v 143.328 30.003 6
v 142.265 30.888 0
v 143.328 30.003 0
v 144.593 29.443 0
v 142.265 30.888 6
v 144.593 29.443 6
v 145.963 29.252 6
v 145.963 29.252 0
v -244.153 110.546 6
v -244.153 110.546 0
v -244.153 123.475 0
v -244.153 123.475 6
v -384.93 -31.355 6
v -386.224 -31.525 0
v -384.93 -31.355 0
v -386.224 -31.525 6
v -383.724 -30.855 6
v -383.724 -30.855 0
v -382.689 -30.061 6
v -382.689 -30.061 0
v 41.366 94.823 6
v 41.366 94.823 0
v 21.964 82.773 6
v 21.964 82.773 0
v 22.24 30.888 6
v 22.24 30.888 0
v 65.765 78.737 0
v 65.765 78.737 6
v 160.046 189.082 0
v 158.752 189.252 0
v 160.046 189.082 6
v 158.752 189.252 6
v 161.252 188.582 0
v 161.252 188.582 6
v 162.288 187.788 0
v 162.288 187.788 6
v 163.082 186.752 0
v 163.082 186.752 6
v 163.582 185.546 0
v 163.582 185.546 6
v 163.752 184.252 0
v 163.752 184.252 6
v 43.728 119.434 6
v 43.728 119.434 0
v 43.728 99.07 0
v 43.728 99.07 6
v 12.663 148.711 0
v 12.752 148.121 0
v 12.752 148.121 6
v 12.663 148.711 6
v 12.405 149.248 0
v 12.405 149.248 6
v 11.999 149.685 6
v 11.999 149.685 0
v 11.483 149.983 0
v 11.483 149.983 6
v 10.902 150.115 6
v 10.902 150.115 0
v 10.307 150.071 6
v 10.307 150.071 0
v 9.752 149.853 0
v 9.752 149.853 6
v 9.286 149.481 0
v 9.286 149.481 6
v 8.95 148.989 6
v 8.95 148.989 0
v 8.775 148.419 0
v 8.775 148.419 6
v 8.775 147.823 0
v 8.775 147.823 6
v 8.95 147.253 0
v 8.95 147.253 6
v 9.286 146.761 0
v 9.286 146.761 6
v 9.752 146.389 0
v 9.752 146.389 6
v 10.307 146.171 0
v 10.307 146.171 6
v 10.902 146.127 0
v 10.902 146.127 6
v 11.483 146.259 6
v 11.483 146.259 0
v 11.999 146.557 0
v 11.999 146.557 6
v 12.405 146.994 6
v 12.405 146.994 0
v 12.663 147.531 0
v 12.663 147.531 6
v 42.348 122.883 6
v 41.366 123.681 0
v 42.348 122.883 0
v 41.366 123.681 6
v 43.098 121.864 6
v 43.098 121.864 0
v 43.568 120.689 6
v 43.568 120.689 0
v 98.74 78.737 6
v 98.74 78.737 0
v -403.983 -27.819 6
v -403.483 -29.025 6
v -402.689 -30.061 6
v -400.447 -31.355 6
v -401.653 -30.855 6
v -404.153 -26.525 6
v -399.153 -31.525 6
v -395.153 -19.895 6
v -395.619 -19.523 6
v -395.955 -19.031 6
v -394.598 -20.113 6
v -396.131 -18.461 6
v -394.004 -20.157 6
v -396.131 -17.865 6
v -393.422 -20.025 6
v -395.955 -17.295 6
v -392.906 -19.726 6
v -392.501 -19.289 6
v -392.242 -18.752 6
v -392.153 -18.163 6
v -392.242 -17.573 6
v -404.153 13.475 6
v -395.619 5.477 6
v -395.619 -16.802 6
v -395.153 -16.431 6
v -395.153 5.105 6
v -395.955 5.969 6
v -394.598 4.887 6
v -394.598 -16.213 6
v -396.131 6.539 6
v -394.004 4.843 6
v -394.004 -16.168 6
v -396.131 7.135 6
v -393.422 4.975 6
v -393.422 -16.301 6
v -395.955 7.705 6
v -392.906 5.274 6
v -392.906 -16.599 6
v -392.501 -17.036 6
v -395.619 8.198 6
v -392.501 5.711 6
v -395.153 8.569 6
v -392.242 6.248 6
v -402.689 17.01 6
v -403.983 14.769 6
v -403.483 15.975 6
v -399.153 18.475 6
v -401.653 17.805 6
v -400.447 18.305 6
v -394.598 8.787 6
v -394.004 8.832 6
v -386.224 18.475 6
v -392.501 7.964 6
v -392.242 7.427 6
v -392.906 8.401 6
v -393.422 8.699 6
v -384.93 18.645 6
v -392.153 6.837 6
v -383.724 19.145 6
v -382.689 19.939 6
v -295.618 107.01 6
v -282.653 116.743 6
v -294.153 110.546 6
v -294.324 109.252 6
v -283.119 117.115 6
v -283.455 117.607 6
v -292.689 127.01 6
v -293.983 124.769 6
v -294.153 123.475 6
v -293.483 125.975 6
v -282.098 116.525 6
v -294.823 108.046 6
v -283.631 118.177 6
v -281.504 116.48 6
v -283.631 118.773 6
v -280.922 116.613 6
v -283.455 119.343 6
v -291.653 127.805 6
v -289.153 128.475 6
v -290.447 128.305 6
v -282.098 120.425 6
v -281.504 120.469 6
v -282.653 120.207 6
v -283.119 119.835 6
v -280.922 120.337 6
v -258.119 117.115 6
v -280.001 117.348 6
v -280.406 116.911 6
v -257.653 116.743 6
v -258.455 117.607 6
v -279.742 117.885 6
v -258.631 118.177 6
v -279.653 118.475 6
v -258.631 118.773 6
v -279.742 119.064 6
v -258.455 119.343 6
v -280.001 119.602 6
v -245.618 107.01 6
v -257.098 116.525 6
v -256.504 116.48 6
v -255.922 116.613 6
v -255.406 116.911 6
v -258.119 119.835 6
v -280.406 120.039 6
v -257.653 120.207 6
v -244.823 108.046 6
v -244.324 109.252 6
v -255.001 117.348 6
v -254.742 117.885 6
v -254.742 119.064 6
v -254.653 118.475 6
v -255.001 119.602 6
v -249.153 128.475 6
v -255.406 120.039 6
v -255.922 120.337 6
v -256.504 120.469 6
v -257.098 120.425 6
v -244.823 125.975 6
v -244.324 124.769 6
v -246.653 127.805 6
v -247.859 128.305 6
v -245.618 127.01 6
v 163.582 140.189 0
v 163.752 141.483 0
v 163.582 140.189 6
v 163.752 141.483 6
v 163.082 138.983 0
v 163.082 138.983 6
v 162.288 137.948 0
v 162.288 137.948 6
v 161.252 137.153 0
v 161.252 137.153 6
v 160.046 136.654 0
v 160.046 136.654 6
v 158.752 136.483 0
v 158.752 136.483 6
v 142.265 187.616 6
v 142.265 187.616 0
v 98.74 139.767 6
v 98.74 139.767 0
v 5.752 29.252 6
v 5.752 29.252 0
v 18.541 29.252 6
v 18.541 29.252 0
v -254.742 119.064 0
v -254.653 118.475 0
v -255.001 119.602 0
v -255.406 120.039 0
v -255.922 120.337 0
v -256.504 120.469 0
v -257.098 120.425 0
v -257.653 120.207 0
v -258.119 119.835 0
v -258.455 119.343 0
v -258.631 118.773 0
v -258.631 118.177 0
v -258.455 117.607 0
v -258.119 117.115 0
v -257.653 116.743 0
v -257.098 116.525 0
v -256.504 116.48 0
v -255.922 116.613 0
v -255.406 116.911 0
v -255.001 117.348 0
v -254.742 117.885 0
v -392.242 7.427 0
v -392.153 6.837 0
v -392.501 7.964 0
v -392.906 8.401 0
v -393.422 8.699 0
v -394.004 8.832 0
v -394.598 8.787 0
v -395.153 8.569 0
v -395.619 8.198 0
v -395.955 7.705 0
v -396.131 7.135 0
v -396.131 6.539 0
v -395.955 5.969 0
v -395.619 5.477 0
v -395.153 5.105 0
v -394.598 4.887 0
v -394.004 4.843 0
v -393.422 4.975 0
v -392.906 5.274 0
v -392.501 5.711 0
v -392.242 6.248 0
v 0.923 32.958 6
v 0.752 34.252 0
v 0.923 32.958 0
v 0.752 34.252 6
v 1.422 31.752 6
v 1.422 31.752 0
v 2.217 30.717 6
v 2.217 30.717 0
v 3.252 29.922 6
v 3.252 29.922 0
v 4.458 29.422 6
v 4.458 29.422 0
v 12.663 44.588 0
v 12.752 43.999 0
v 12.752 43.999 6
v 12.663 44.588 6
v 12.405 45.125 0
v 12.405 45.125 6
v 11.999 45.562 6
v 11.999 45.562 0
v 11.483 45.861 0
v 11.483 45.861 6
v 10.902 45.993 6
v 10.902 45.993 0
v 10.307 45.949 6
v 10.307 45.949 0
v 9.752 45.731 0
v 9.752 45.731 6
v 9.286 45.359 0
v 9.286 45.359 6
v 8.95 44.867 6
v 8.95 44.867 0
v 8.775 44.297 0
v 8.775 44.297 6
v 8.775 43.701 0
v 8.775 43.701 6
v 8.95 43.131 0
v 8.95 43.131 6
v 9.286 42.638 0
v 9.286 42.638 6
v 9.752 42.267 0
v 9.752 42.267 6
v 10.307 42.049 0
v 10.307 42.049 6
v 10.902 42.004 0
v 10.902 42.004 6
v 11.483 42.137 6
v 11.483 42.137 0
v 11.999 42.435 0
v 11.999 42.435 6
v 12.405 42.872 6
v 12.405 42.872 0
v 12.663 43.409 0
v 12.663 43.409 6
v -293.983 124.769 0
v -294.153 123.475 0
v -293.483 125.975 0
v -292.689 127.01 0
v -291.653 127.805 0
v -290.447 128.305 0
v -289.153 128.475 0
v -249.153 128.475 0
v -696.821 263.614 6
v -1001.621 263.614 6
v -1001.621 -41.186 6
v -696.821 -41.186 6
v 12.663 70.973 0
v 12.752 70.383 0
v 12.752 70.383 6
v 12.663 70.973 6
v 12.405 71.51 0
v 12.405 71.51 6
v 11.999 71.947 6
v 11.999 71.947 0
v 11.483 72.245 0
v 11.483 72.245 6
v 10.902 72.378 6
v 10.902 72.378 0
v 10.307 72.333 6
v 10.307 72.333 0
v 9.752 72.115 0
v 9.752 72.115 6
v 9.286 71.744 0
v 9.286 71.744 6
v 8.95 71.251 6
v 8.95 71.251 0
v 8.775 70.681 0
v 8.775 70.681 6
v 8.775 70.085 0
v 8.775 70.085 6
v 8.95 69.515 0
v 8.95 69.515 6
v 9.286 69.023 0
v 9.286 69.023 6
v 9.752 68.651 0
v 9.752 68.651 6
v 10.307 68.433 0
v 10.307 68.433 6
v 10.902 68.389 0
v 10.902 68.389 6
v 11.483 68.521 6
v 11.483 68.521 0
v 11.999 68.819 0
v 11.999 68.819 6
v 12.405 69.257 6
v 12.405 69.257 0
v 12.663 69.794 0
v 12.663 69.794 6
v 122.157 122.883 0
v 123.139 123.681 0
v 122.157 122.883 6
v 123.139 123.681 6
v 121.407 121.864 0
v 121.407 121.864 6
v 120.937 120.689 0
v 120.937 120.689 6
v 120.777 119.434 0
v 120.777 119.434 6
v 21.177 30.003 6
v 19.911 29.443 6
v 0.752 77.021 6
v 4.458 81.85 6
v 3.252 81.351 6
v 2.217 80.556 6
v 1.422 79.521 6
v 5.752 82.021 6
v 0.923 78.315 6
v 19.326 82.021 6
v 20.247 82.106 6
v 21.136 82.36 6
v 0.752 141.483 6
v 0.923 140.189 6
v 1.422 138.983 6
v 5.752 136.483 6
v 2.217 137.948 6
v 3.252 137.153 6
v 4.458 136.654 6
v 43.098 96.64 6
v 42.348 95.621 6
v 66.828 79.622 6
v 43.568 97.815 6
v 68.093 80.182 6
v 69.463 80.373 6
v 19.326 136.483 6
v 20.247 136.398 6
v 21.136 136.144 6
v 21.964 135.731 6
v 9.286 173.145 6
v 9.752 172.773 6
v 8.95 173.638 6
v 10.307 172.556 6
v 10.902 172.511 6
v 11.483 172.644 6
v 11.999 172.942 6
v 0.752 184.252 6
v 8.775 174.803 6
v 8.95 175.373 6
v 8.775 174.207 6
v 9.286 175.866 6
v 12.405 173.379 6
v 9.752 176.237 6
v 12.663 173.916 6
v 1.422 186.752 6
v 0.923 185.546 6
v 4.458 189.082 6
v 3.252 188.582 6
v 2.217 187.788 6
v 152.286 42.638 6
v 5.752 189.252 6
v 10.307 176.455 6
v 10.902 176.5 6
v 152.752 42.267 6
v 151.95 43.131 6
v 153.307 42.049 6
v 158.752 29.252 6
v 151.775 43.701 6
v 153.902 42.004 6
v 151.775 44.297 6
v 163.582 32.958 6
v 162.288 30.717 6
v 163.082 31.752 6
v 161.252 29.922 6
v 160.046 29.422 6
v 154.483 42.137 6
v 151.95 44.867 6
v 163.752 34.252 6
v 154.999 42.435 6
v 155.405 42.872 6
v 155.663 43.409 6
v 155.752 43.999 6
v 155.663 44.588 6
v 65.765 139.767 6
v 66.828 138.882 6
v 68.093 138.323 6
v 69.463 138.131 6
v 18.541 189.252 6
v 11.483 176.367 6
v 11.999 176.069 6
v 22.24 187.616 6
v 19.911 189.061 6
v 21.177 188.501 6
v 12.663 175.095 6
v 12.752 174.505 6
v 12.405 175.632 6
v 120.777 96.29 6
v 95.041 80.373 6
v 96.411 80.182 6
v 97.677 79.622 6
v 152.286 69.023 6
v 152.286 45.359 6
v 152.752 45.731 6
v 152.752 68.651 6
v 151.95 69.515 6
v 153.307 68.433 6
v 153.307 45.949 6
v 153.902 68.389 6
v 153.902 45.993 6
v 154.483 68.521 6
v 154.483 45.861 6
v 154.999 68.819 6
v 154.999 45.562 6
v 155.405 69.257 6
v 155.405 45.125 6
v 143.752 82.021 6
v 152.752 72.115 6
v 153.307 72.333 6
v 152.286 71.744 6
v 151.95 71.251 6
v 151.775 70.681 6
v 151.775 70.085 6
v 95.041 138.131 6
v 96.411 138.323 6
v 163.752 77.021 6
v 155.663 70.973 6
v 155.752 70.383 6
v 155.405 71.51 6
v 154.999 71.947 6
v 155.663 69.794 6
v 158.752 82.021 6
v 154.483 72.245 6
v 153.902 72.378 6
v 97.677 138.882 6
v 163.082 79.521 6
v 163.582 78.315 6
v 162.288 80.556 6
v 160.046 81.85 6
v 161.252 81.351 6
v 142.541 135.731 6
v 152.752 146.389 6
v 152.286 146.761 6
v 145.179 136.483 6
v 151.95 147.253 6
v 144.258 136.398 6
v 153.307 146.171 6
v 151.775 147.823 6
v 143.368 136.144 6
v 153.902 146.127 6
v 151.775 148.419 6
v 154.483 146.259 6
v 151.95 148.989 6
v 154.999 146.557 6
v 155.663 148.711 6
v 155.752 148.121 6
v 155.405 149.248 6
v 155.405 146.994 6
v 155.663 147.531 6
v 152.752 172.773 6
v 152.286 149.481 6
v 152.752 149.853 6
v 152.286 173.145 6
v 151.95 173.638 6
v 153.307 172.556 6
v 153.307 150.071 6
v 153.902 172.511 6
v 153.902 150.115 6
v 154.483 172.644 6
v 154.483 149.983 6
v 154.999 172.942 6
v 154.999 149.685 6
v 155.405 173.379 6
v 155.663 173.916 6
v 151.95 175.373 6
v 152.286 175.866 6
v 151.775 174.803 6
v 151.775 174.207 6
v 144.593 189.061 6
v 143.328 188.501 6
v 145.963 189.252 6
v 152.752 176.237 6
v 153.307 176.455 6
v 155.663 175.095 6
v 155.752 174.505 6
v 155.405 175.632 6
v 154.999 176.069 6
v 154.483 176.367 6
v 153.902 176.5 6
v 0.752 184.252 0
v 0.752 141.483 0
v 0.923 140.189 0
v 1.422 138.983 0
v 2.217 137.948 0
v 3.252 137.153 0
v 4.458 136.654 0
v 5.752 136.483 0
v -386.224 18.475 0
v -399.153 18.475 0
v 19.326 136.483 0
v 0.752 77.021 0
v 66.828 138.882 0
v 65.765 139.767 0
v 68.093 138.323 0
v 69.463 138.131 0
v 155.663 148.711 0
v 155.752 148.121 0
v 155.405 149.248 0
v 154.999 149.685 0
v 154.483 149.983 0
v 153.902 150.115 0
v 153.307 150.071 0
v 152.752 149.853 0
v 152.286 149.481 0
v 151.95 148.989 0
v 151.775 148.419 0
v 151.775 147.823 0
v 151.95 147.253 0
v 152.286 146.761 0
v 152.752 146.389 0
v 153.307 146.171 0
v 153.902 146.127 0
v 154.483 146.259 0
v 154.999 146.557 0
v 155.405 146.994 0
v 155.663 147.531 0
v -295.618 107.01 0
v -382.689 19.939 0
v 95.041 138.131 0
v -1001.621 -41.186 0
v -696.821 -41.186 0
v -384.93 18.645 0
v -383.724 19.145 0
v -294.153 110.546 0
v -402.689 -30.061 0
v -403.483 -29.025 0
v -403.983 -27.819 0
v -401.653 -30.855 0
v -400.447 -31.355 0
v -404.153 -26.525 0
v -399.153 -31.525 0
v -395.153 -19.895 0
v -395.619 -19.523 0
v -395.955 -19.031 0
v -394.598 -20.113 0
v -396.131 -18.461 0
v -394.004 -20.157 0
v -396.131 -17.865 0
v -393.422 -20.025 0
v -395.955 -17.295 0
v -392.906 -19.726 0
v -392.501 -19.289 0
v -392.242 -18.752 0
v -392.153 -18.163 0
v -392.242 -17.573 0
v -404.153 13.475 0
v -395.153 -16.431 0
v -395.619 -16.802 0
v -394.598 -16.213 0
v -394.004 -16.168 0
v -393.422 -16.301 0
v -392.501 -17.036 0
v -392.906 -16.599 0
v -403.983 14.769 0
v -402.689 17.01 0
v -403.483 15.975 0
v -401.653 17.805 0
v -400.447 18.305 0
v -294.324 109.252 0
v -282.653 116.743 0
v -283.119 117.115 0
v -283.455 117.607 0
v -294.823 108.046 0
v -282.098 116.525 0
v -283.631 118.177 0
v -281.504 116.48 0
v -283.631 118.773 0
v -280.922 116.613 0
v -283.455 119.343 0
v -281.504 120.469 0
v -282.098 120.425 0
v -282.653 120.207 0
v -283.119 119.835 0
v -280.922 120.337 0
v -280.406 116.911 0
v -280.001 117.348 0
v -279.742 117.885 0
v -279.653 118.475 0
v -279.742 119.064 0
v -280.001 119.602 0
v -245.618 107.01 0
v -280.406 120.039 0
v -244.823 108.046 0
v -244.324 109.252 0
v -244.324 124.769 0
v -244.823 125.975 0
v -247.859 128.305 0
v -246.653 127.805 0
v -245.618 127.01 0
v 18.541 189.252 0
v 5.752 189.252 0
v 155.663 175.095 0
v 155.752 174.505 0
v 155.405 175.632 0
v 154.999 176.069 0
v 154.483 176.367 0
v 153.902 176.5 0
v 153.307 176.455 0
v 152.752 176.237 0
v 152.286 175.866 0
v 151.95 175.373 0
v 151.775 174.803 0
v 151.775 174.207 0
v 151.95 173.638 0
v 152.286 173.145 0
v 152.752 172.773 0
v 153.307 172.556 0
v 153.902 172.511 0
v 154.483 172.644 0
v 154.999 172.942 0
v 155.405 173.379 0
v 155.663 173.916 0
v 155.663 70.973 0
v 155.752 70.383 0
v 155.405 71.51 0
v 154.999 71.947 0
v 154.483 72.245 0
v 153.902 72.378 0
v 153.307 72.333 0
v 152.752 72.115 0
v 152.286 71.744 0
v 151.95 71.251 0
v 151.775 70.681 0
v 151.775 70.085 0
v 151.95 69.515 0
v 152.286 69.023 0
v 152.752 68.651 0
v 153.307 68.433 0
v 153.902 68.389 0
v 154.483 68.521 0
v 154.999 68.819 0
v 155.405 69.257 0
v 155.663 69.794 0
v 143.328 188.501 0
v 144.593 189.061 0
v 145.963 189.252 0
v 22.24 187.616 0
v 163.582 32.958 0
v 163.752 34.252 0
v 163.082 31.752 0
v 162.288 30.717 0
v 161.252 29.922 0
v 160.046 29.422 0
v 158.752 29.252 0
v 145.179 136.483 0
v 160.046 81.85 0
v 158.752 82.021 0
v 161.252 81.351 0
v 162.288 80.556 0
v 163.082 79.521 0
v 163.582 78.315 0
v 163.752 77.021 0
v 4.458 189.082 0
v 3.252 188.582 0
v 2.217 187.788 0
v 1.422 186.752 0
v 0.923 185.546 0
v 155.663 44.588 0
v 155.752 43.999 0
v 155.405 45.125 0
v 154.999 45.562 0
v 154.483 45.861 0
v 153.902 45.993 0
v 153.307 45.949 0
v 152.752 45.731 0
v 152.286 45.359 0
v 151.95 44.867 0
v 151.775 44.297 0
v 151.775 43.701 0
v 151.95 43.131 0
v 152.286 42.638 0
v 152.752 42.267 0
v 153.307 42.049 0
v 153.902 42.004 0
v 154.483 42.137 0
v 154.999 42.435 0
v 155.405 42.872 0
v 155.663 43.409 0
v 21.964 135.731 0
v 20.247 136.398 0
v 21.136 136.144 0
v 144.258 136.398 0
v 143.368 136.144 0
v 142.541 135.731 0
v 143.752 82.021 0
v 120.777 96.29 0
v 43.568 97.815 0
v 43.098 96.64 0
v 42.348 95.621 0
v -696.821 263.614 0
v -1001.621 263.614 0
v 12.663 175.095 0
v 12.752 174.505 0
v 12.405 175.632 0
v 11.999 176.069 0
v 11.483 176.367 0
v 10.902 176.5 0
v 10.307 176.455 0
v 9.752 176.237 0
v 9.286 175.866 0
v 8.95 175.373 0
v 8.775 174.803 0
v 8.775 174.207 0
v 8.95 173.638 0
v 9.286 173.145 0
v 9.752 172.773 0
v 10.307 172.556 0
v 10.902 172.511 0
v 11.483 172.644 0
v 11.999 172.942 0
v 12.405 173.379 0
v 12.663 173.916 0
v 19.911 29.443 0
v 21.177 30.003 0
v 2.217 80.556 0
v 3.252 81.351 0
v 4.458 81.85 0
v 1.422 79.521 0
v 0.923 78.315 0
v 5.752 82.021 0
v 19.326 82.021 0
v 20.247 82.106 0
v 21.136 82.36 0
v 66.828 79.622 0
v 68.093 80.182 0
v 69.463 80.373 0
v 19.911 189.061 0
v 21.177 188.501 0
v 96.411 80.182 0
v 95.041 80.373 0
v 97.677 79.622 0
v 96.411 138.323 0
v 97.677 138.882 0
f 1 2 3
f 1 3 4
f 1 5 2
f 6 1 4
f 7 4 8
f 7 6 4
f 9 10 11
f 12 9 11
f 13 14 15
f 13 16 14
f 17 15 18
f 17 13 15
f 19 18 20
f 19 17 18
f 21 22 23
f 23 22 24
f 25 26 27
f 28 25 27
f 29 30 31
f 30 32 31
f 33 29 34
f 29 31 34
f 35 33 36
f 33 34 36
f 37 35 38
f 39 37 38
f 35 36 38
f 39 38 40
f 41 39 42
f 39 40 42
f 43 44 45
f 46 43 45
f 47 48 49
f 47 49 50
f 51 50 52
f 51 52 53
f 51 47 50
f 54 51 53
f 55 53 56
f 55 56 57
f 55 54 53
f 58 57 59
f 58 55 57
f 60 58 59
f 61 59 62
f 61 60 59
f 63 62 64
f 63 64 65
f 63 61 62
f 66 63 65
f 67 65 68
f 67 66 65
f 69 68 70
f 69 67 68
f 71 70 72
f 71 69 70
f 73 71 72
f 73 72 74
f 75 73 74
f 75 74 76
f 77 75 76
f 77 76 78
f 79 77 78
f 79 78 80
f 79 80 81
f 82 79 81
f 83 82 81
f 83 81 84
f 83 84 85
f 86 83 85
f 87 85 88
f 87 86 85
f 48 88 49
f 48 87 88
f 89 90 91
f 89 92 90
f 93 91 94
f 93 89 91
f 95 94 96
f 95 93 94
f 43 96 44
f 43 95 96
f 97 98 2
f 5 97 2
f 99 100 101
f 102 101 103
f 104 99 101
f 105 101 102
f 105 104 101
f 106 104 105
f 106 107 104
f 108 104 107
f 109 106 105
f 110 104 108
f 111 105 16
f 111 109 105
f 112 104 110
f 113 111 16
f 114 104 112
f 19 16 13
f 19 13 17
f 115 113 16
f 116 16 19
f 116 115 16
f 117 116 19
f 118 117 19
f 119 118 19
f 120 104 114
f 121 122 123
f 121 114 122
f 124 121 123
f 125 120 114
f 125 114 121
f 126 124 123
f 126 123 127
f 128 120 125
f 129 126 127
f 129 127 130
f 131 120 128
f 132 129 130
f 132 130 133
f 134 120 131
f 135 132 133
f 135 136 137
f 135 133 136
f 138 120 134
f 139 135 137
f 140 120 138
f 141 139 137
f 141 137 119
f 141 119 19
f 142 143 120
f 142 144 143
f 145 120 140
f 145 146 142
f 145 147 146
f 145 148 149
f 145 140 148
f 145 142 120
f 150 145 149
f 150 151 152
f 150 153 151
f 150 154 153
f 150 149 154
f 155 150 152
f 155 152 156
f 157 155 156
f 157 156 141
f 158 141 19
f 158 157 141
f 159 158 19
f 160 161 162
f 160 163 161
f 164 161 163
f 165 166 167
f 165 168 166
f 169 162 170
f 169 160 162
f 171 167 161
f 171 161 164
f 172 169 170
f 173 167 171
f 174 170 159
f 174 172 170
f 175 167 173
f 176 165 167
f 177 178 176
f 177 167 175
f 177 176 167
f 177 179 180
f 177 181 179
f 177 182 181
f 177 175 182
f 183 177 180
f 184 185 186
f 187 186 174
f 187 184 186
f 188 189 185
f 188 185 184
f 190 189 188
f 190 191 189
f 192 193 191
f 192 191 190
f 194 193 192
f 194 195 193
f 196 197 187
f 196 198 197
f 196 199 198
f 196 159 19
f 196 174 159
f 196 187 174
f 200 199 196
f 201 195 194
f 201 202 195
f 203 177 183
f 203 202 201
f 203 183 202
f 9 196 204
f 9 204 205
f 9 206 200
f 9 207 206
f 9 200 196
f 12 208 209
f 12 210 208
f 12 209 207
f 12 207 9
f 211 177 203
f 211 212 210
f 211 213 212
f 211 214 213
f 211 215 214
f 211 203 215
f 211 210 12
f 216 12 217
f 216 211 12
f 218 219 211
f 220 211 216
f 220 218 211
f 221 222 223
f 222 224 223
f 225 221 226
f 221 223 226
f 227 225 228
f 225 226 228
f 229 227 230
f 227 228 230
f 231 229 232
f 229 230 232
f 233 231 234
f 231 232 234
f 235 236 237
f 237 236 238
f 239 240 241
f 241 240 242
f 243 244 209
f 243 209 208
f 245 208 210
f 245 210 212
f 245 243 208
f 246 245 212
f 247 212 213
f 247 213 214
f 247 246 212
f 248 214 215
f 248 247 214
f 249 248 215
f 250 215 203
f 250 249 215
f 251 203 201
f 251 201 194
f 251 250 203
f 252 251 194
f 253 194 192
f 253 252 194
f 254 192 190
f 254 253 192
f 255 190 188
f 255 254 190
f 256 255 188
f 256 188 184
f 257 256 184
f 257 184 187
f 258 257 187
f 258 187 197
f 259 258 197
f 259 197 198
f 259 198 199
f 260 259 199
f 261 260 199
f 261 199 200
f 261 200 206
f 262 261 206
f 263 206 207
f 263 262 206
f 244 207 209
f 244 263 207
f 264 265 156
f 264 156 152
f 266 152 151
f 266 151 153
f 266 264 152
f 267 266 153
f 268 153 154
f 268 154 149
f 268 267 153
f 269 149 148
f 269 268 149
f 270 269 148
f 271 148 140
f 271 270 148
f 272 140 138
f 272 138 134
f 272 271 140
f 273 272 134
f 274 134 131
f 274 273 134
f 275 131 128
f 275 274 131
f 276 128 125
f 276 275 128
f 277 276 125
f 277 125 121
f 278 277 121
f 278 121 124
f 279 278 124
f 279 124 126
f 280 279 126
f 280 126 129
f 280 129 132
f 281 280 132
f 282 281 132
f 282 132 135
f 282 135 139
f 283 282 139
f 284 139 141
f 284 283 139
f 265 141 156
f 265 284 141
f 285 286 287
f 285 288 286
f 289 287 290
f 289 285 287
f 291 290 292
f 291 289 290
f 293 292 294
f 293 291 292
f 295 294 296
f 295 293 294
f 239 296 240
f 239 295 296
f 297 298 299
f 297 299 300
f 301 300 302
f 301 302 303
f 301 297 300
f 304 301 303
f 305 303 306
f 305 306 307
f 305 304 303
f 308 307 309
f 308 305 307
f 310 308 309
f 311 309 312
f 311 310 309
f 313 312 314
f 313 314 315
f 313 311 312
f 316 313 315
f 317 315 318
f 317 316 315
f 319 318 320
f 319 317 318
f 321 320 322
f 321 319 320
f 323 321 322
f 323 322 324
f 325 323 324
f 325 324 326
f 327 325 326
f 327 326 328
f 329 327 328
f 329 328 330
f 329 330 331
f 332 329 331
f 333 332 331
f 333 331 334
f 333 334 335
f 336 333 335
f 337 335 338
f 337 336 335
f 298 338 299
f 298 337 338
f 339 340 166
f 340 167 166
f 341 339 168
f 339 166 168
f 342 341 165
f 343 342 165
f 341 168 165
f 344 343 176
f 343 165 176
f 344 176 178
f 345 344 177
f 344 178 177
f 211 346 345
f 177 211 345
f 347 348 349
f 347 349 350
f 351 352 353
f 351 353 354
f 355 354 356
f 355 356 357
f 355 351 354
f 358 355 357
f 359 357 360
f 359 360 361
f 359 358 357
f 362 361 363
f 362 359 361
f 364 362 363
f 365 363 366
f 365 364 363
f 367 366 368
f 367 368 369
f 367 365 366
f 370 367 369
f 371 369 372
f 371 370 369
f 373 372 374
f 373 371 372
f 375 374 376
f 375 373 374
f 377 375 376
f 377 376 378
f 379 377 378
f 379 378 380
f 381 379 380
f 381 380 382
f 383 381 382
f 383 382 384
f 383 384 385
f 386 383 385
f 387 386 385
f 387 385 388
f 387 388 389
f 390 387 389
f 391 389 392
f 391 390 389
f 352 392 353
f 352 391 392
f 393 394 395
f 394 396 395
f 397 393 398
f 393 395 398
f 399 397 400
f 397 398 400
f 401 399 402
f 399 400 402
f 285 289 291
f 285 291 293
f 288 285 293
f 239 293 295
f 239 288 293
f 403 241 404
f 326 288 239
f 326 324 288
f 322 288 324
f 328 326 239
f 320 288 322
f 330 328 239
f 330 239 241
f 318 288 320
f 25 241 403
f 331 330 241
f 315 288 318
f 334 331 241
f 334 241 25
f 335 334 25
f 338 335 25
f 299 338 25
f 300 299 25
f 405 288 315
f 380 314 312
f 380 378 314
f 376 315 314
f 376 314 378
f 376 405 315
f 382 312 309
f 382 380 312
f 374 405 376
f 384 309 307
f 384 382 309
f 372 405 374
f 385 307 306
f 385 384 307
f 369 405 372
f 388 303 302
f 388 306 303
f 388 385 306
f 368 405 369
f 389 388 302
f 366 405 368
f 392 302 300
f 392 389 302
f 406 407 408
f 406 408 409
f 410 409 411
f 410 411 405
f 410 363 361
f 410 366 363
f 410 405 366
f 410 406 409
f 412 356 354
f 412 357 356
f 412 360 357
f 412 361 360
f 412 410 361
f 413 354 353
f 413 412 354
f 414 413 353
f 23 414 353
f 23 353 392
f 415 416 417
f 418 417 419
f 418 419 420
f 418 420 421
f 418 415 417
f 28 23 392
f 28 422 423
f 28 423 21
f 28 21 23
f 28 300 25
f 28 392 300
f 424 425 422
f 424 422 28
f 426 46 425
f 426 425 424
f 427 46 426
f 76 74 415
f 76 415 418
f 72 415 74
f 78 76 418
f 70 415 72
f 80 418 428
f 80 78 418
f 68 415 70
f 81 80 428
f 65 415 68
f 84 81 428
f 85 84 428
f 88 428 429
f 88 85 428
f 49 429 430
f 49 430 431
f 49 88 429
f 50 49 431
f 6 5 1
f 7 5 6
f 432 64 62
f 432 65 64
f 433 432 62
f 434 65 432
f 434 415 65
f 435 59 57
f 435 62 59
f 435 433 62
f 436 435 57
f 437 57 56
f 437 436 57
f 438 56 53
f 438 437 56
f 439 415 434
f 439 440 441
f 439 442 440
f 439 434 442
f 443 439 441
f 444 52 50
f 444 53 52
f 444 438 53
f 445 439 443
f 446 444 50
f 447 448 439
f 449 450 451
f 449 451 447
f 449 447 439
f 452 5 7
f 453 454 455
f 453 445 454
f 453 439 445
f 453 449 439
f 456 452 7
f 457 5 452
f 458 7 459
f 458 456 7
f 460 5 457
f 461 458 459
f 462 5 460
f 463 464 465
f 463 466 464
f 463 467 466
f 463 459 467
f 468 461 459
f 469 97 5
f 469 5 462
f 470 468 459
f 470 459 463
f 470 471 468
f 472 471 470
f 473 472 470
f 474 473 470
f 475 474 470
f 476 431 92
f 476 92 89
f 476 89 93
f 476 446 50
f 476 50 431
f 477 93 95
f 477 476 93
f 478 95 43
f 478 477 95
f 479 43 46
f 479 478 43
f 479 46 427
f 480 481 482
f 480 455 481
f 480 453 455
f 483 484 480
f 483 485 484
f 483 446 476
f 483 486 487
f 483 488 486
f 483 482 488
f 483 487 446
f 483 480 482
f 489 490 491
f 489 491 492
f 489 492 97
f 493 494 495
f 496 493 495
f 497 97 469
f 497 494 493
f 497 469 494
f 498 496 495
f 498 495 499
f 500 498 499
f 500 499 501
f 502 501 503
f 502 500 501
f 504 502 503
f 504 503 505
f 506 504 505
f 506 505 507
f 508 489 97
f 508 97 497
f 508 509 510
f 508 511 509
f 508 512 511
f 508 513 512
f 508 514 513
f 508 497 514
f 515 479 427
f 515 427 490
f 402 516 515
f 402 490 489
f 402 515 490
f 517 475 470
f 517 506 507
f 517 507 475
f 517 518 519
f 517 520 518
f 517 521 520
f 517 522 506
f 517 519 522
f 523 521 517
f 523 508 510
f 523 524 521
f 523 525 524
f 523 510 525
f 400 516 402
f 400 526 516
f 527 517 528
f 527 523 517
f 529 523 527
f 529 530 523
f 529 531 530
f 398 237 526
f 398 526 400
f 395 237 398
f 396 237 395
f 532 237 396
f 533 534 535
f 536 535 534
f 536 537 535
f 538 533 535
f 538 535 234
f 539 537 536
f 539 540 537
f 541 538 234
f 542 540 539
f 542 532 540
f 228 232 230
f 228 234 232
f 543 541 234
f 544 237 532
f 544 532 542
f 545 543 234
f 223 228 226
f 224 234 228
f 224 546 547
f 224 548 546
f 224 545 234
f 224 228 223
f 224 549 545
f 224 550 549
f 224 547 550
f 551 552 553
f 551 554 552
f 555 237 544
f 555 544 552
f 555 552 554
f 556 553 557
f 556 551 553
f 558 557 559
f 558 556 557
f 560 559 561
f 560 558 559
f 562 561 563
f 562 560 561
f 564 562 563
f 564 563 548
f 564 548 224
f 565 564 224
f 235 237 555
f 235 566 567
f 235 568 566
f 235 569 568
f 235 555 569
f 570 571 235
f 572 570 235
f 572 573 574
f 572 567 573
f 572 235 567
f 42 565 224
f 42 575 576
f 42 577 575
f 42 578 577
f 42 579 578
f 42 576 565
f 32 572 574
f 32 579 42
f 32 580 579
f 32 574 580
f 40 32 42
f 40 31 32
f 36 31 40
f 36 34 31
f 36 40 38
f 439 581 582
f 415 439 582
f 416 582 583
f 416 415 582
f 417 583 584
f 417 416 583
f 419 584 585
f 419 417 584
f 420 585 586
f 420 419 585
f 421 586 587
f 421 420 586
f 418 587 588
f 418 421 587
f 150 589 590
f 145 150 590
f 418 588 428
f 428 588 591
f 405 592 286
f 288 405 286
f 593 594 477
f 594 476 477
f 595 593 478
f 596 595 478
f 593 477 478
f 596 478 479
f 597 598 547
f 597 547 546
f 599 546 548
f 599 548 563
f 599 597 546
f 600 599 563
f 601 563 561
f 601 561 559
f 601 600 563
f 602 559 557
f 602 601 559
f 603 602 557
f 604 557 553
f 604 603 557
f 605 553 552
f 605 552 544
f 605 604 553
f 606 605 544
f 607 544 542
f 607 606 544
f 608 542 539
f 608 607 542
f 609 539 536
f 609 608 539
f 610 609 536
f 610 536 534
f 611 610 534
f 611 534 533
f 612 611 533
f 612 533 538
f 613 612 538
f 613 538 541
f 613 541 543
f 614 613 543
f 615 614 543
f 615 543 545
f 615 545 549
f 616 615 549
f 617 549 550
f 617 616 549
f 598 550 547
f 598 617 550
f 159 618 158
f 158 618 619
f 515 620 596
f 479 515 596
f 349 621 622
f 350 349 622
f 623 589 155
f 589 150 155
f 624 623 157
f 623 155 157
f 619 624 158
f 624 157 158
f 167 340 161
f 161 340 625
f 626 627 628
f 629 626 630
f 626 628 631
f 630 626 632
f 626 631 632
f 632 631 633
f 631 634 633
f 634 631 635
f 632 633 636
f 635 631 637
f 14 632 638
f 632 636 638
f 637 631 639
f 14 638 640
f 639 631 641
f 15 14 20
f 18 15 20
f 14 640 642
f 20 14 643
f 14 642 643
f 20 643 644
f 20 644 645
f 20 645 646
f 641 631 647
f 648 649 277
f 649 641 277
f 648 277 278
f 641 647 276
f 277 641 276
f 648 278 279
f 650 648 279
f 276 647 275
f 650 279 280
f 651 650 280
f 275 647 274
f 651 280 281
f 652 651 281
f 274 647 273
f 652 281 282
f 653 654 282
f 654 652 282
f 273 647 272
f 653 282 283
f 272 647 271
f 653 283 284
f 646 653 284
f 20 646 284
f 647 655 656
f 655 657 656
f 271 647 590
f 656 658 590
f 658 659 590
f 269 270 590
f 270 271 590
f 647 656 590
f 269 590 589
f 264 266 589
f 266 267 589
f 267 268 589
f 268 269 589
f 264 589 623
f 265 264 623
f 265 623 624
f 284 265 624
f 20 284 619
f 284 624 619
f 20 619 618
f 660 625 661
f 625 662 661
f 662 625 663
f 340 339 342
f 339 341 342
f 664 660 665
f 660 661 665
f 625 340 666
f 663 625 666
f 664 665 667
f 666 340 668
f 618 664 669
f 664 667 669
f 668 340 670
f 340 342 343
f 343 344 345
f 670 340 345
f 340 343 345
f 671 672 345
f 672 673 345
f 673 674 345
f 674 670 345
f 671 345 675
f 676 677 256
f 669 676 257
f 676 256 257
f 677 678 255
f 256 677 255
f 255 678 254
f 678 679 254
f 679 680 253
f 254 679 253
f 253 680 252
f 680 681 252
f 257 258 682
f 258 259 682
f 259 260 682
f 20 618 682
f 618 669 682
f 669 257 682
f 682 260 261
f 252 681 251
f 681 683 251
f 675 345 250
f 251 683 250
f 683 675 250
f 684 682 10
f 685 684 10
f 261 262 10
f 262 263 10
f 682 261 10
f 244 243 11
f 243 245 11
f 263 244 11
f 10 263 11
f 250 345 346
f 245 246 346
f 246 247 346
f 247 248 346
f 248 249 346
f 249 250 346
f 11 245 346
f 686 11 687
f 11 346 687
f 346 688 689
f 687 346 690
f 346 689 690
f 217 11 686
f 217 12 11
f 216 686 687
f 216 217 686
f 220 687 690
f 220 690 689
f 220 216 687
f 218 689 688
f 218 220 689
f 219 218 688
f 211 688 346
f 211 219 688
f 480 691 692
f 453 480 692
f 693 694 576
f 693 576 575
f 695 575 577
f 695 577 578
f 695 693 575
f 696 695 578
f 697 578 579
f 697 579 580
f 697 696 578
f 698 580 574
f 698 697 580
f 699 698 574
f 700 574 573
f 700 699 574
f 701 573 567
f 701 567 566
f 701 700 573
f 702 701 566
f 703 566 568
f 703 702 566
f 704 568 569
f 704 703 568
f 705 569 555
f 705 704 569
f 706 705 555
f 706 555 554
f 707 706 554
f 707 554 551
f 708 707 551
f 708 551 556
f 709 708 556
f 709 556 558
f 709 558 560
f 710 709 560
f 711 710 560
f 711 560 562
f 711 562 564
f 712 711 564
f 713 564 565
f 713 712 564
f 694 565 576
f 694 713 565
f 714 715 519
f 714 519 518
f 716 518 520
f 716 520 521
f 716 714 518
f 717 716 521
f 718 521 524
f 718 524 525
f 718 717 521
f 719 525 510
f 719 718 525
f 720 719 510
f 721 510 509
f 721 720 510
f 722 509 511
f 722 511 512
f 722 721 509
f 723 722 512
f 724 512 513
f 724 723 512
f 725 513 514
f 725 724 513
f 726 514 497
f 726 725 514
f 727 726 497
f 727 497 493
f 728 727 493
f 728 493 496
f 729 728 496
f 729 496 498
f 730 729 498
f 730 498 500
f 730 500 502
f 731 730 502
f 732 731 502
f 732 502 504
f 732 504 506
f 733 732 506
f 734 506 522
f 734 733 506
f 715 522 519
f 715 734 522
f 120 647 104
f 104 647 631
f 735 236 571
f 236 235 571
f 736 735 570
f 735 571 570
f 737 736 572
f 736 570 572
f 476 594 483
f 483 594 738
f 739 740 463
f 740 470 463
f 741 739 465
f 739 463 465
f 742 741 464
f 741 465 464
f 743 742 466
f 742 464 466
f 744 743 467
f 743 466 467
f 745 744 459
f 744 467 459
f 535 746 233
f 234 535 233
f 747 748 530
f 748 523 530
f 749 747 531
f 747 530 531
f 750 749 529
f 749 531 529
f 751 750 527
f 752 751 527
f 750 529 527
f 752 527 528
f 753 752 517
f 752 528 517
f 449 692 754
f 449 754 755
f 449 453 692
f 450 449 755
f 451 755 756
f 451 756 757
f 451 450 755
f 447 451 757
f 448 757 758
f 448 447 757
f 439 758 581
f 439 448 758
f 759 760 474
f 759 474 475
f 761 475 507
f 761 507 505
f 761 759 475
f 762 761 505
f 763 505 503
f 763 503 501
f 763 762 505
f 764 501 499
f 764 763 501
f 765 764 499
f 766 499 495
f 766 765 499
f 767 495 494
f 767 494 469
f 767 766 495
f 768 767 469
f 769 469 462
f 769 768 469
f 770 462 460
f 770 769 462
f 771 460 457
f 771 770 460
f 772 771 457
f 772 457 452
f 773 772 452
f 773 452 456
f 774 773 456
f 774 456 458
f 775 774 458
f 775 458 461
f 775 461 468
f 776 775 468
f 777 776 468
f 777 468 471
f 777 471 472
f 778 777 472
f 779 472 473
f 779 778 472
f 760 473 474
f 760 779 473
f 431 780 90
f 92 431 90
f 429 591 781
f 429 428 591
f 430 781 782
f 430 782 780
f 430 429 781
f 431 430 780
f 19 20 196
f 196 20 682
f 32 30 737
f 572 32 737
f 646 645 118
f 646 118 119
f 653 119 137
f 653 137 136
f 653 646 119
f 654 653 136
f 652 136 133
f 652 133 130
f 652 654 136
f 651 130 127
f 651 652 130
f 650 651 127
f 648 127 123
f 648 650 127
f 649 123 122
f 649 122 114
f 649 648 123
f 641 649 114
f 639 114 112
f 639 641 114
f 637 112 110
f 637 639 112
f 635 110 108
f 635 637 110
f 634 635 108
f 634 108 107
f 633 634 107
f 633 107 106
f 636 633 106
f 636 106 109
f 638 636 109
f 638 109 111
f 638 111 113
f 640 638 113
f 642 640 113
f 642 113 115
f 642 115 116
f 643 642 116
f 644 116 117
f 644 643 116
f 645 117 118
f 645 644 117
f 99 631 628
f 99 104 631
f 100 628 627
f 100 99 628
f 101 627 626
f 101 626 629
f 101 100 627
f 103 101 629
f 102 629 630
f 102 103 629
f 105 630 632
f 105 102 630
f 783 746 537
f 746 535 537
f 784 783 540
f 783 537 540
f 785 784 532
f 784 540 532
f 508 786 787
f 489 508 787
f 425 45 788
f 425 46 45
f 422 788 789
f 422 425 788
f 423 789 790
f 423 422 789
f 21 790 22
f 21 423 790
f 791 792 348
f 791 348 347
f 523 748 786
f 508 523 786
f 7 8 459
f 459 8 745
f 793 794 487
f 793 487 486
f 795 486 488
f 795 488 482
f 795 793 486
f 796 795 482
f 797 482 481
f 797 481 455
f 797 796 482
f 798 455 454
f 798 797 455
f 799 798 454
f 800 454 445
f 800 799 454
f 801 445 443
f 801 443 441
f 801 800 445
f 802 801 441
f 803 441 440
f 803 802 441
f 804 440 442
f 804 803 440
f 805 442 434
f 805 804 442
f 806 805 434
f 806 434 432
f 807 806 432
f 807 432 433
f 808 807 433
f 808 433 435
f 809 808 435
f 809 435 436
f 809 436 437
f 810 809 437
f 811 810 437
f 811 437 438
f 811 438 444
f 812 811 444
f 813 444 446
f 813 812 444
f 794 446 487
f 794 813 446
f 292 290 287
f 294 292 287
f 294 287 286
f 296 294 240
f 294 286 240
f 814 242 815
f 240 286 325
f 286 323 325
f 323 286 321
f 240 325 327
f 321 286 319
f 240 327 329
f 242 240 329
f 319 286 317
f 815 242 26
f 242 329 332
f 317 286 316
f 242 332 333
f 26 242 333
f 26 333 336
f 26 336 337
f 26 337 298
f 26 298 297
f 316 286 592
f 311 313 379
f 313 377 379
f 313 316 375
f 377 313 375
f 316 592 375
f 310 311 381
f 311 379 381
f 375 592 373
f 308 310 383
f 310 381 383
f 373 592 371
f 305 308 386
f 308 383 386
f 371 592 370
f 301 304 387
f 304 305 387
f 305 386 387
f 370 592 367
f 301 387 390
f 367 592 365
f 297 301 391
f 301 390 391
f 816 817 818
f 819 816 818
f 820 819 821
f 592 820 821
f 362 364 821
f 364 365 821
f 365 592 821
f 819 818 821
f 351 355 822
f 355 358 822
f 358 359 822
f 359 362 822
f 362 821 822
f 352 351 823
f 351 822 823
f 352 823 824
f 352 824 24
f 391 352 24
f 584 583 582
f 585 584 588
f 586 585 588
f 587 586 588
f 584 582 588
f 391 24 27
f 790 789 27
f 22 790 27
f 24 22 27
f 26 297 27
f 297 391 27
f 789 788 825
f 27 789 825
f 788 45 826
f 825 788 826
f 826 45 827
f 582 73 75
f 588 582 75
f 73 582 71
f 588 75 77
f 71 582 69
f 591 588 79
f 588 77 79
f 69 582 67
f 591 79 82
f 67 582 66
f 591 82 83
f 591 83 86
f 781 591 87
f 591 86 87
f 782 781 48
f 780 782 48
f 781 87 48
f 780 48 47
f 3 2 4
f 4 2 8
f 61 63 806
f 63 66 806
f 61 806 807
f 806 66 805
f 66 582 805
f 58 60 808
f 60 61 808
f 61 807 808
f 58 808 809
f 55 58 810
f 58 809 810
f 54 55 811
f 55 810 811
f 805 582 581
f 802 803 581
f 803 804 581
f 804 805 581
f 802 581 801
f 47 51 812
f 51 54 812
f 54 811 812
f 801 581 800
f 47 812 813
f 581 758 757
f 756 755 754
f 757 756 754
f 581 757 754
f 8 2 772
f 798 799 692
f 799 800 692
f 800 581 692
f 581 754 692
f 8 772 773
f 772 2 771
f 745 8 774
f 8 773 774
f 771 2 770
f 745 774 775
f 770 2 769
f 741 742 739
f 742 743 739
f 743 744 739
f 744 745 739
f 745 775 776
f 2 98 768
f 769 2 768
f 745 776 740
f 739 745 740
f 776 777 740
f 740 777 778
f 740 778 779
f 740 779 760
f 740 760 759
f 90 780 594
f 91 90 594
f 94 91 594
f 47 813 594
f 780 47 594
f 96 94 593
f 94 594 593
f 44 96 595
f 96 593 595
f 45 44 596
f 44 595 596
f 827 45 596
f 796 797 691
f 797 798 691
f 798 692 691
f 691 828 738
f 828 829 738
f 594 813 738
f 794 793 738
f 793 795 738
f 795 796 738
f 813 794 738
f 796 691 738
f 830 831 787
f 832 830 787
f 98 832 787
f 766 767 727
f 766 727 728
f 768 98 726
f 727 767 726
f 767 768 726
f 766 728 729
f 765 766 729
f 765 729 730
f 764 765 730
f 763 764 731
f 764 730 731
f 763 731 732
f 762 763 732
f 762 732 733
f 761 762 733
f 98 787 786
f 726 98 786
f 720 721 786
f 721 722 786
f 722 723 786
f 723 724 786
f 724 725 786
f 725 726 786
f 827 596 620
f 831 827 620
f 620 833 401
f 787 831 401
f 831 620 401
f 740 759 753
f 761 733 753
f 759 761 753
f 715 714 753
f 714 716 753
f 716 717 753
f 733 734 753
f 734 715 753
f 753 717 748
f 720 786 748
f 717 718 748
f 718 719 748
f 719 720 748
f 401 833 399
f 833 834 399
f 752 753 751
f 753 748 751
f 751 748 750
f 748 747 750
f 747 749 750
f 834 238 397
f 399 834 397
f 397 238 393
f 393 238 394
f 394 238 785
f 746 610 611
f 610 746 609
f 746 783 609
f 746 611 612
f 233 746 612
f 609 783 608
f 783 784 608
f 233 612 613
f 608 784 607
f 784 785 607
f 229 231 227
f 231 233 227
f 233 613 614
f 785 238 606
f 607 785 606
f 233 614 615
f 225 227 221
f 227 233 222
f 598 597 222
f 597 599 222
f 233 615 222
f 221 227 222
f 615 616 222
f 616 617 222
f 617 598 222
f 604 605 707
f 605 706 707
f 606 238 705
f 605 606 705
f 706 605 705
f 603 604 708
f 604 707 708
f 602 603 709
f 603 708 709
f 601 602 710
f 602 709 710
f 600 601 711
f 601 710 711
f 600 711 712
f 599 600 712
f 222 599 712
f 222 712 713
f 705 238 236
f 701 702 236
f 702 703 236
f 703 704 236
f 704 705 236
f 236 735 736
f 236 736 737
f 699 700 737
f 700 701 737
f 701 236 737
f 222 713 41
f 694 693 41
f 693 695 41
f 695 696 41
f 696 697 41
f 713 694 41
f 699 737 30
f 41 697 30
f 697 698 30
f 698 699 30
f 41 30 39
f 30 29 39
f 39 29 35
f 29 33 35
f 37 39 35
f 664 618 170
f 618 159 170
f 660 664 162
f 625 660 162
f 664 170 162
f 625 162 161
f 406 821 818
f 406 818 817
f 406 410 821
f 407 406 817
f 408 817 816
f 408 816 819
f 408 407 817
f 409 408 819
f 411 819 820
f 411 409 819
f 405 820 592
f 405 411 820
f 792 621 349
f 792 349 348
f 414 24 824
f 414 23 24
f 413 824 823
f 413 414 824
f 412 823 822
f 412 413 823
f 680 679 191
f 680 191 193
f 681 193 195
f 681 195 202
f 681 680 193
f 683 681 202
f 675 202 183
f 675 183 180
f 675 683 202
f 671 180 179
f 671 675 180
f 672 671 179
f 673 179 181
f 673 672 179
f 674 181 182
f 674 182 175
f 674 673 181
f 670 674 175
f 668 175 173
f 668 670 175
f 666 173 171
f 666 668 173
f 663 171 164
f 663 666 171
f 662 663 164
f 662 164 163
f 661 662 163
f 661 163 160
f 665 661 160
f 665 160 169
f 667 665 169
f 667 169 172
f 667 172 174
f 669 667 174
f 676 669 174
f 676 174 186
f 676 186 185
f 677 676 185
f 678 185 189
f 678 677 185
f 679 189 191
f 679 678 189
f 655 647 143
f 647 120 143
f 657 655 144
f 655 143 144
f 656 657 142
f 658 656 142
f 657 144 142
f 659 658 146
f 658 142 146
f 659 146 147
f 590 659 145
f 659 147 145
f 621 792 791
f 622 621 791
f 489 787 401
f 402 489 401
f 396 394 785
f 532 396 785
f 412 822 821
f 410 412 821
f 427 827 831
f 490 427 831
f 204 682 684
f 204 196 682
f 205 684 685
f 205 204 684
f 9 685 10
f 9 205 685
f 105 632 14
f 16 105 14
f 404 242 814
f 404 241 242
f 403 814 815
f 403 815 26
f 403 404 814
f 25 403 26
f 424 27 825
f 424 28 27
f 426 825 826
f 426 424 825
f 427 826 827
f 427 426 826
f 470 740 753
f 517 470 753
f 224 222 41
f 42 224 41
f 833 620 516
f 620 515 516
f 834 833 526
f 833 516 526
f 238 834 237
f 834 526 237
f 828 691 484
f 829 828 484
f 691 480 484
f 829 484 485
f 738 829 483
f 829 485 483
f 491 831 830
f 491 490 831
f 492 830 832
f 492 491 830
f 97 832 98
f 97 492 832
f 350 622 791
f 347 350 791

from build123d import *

# Parameters (mm, degrees)
F0_R     = 2
F1_DEPTH = 6
F2_R     = 5
F3_W     = 304.8
F3_H     = 304.8
F4_DEPTH = 6


with BuildPart() as f1:
    # F0 (on Top) → F1 (new body)
    with BuildSketch(Plane.XY):
        Polygon((20.752255, 189.252079), (0.752255, 189.252079), (0.752255, 136.483288), (20.752255, 136.483288), (43.727751, 122.214279), (43.727751, 96.289878), (20.752255, 82.02087), (0.752255, 82.02087), (0.752255, 29.252079), (20.752255, 29.252079), (67.252255, 80.372884), (82.252255, 80.372884), (97.252255, 80.372884), (143.752255, 29.252079), (163.752255, 29.252079), (163.752255, 82.02087), (143.752255, 82.02087), (120.776759, 96.289878), (120.776759, 122.214279), (143.752255, 136.483288), (163.752255, 136.483288), (163.752255, 189.252079), (143.752255, 189.252079), (97.252255, 138.131273), (82.252255, 138.131273), (67.252255, 138.131273), align=None)
        with Locations((10.752255, 43.99876)):
            Circle(F0_R, mode=Mode.SUBTRACT)
        with Locations((10.752255, 70.383156)):
            Circle(F0_R, mode=Mode.SUBTRACT)
        with Locations((153.752255, 43.99876)):
            Circle(F0_R, mode=Mode.SUBTRACT)
        with Locations((153.752255, 70.383156)):
            Circle(F0_R, mode=Mode.SUBTRACT)
        with Locations((10.752255, 148.121001)):
            Circle(F0_R, mode=Mode.SUBTRACT)
        with Locations((10.752255, 174.505397)):
            Circle(F0_R, mode=Mode.SUBTRACT)
        with Locations((153.752255, 148.121001)):
            Circle(F0_R, mode=Mode.SUBTRACT)
        with Locations((153.752255, 174.505397)):
            Circle(F0_R, mode=Mode.SUBTRACT)
        Polygon((-404.153171, 18.474887), (-404.153171, -31.525113), (-384.153171, -31.525113), (-244.153171, 108.474887), (-244.153171, 128.474887), (-264.153171, 128.474887), (-294.153171, 128.474887), (-294.153171, 108.474887), (-384.153171, 18.474887), align=None)
        with Locations((-394.153171, -18.162827)):
            Circle(F0_R, mode=Mode.SUBTRACT)
        with Locations((-394.153171, 6.837173)):
            Circle(F0_R, mode=Mode.SUBTRACT)
        with Locations((-281.653171, 118.474887)):
            Circle(F0_R, mode=Mode.SUBTRACT)
        with Locations((-256.653171, 118.474887)):
            Circle(F0_R, mode=Mode.SUBTRACT)
    extrude(amount=F1_DEPTH)

    # F2
    f2_edges = [f1.edges().sort_by_distance(p)[0] for p in [
        (67.252255, 138.131273, 3),
        (97.252255, 138.131273, 3),
        (143.752255, 189.252079, 3),
        (20.752255, 189.252079, 3),
        (20.752255, 136.483288, 3),
        (43.727751, 122.214279, 3),
        (43.727751, 96.289878, 3),
        (20.752255, 82.02087, 3),
        (0.752255, 189.252079, 3),
        (163.752255, 189.252079, 3),
        (163.752255, 82.02087, 3),
        (0.752255, 82.02087, 3),
        (0.752255, 136.483288, 3),
        (20.752255, 29.252079, 3),
        (67.252255, 80.372884, 3),
        (97.252255, 80.372884, 3),
        (120.776759, 122.214279, 3),
        (143.752255, 136.483288, 3),
        (163.752255, 136.483288, 3),
        (163.752255, 29.252079, 3),
        (143.752255, 29.252079, 3),
        (0.752255, 29.252079, 3),
        (-294.153171, 128.474887, 3),
        (-294.153171, 108.474887, 3),
        (-384.153171, 18.474887, 3),
        (-404.153171, 18.474887, 3),
        (-244.153171, 128.474887, 3),
        (-244.153171, 108.474887, 3),
        (-384.153171, -31.525113, 3),
        (-404.153171, -31.525113, 3),
    ]]
    fillet(f2_edges, radius=F2_R)


with BuildPart() as f4:
    # F3 (on Top) → F4 (new body)
    with BuildSketch(Plane.XY):
        with Locations((-849.220872, 111.214371)):
            Rectangle(F3_W, F3_H)
    extrude(amount=F4_DEPTH)


solid = Compound([f1.part, f4.part])
